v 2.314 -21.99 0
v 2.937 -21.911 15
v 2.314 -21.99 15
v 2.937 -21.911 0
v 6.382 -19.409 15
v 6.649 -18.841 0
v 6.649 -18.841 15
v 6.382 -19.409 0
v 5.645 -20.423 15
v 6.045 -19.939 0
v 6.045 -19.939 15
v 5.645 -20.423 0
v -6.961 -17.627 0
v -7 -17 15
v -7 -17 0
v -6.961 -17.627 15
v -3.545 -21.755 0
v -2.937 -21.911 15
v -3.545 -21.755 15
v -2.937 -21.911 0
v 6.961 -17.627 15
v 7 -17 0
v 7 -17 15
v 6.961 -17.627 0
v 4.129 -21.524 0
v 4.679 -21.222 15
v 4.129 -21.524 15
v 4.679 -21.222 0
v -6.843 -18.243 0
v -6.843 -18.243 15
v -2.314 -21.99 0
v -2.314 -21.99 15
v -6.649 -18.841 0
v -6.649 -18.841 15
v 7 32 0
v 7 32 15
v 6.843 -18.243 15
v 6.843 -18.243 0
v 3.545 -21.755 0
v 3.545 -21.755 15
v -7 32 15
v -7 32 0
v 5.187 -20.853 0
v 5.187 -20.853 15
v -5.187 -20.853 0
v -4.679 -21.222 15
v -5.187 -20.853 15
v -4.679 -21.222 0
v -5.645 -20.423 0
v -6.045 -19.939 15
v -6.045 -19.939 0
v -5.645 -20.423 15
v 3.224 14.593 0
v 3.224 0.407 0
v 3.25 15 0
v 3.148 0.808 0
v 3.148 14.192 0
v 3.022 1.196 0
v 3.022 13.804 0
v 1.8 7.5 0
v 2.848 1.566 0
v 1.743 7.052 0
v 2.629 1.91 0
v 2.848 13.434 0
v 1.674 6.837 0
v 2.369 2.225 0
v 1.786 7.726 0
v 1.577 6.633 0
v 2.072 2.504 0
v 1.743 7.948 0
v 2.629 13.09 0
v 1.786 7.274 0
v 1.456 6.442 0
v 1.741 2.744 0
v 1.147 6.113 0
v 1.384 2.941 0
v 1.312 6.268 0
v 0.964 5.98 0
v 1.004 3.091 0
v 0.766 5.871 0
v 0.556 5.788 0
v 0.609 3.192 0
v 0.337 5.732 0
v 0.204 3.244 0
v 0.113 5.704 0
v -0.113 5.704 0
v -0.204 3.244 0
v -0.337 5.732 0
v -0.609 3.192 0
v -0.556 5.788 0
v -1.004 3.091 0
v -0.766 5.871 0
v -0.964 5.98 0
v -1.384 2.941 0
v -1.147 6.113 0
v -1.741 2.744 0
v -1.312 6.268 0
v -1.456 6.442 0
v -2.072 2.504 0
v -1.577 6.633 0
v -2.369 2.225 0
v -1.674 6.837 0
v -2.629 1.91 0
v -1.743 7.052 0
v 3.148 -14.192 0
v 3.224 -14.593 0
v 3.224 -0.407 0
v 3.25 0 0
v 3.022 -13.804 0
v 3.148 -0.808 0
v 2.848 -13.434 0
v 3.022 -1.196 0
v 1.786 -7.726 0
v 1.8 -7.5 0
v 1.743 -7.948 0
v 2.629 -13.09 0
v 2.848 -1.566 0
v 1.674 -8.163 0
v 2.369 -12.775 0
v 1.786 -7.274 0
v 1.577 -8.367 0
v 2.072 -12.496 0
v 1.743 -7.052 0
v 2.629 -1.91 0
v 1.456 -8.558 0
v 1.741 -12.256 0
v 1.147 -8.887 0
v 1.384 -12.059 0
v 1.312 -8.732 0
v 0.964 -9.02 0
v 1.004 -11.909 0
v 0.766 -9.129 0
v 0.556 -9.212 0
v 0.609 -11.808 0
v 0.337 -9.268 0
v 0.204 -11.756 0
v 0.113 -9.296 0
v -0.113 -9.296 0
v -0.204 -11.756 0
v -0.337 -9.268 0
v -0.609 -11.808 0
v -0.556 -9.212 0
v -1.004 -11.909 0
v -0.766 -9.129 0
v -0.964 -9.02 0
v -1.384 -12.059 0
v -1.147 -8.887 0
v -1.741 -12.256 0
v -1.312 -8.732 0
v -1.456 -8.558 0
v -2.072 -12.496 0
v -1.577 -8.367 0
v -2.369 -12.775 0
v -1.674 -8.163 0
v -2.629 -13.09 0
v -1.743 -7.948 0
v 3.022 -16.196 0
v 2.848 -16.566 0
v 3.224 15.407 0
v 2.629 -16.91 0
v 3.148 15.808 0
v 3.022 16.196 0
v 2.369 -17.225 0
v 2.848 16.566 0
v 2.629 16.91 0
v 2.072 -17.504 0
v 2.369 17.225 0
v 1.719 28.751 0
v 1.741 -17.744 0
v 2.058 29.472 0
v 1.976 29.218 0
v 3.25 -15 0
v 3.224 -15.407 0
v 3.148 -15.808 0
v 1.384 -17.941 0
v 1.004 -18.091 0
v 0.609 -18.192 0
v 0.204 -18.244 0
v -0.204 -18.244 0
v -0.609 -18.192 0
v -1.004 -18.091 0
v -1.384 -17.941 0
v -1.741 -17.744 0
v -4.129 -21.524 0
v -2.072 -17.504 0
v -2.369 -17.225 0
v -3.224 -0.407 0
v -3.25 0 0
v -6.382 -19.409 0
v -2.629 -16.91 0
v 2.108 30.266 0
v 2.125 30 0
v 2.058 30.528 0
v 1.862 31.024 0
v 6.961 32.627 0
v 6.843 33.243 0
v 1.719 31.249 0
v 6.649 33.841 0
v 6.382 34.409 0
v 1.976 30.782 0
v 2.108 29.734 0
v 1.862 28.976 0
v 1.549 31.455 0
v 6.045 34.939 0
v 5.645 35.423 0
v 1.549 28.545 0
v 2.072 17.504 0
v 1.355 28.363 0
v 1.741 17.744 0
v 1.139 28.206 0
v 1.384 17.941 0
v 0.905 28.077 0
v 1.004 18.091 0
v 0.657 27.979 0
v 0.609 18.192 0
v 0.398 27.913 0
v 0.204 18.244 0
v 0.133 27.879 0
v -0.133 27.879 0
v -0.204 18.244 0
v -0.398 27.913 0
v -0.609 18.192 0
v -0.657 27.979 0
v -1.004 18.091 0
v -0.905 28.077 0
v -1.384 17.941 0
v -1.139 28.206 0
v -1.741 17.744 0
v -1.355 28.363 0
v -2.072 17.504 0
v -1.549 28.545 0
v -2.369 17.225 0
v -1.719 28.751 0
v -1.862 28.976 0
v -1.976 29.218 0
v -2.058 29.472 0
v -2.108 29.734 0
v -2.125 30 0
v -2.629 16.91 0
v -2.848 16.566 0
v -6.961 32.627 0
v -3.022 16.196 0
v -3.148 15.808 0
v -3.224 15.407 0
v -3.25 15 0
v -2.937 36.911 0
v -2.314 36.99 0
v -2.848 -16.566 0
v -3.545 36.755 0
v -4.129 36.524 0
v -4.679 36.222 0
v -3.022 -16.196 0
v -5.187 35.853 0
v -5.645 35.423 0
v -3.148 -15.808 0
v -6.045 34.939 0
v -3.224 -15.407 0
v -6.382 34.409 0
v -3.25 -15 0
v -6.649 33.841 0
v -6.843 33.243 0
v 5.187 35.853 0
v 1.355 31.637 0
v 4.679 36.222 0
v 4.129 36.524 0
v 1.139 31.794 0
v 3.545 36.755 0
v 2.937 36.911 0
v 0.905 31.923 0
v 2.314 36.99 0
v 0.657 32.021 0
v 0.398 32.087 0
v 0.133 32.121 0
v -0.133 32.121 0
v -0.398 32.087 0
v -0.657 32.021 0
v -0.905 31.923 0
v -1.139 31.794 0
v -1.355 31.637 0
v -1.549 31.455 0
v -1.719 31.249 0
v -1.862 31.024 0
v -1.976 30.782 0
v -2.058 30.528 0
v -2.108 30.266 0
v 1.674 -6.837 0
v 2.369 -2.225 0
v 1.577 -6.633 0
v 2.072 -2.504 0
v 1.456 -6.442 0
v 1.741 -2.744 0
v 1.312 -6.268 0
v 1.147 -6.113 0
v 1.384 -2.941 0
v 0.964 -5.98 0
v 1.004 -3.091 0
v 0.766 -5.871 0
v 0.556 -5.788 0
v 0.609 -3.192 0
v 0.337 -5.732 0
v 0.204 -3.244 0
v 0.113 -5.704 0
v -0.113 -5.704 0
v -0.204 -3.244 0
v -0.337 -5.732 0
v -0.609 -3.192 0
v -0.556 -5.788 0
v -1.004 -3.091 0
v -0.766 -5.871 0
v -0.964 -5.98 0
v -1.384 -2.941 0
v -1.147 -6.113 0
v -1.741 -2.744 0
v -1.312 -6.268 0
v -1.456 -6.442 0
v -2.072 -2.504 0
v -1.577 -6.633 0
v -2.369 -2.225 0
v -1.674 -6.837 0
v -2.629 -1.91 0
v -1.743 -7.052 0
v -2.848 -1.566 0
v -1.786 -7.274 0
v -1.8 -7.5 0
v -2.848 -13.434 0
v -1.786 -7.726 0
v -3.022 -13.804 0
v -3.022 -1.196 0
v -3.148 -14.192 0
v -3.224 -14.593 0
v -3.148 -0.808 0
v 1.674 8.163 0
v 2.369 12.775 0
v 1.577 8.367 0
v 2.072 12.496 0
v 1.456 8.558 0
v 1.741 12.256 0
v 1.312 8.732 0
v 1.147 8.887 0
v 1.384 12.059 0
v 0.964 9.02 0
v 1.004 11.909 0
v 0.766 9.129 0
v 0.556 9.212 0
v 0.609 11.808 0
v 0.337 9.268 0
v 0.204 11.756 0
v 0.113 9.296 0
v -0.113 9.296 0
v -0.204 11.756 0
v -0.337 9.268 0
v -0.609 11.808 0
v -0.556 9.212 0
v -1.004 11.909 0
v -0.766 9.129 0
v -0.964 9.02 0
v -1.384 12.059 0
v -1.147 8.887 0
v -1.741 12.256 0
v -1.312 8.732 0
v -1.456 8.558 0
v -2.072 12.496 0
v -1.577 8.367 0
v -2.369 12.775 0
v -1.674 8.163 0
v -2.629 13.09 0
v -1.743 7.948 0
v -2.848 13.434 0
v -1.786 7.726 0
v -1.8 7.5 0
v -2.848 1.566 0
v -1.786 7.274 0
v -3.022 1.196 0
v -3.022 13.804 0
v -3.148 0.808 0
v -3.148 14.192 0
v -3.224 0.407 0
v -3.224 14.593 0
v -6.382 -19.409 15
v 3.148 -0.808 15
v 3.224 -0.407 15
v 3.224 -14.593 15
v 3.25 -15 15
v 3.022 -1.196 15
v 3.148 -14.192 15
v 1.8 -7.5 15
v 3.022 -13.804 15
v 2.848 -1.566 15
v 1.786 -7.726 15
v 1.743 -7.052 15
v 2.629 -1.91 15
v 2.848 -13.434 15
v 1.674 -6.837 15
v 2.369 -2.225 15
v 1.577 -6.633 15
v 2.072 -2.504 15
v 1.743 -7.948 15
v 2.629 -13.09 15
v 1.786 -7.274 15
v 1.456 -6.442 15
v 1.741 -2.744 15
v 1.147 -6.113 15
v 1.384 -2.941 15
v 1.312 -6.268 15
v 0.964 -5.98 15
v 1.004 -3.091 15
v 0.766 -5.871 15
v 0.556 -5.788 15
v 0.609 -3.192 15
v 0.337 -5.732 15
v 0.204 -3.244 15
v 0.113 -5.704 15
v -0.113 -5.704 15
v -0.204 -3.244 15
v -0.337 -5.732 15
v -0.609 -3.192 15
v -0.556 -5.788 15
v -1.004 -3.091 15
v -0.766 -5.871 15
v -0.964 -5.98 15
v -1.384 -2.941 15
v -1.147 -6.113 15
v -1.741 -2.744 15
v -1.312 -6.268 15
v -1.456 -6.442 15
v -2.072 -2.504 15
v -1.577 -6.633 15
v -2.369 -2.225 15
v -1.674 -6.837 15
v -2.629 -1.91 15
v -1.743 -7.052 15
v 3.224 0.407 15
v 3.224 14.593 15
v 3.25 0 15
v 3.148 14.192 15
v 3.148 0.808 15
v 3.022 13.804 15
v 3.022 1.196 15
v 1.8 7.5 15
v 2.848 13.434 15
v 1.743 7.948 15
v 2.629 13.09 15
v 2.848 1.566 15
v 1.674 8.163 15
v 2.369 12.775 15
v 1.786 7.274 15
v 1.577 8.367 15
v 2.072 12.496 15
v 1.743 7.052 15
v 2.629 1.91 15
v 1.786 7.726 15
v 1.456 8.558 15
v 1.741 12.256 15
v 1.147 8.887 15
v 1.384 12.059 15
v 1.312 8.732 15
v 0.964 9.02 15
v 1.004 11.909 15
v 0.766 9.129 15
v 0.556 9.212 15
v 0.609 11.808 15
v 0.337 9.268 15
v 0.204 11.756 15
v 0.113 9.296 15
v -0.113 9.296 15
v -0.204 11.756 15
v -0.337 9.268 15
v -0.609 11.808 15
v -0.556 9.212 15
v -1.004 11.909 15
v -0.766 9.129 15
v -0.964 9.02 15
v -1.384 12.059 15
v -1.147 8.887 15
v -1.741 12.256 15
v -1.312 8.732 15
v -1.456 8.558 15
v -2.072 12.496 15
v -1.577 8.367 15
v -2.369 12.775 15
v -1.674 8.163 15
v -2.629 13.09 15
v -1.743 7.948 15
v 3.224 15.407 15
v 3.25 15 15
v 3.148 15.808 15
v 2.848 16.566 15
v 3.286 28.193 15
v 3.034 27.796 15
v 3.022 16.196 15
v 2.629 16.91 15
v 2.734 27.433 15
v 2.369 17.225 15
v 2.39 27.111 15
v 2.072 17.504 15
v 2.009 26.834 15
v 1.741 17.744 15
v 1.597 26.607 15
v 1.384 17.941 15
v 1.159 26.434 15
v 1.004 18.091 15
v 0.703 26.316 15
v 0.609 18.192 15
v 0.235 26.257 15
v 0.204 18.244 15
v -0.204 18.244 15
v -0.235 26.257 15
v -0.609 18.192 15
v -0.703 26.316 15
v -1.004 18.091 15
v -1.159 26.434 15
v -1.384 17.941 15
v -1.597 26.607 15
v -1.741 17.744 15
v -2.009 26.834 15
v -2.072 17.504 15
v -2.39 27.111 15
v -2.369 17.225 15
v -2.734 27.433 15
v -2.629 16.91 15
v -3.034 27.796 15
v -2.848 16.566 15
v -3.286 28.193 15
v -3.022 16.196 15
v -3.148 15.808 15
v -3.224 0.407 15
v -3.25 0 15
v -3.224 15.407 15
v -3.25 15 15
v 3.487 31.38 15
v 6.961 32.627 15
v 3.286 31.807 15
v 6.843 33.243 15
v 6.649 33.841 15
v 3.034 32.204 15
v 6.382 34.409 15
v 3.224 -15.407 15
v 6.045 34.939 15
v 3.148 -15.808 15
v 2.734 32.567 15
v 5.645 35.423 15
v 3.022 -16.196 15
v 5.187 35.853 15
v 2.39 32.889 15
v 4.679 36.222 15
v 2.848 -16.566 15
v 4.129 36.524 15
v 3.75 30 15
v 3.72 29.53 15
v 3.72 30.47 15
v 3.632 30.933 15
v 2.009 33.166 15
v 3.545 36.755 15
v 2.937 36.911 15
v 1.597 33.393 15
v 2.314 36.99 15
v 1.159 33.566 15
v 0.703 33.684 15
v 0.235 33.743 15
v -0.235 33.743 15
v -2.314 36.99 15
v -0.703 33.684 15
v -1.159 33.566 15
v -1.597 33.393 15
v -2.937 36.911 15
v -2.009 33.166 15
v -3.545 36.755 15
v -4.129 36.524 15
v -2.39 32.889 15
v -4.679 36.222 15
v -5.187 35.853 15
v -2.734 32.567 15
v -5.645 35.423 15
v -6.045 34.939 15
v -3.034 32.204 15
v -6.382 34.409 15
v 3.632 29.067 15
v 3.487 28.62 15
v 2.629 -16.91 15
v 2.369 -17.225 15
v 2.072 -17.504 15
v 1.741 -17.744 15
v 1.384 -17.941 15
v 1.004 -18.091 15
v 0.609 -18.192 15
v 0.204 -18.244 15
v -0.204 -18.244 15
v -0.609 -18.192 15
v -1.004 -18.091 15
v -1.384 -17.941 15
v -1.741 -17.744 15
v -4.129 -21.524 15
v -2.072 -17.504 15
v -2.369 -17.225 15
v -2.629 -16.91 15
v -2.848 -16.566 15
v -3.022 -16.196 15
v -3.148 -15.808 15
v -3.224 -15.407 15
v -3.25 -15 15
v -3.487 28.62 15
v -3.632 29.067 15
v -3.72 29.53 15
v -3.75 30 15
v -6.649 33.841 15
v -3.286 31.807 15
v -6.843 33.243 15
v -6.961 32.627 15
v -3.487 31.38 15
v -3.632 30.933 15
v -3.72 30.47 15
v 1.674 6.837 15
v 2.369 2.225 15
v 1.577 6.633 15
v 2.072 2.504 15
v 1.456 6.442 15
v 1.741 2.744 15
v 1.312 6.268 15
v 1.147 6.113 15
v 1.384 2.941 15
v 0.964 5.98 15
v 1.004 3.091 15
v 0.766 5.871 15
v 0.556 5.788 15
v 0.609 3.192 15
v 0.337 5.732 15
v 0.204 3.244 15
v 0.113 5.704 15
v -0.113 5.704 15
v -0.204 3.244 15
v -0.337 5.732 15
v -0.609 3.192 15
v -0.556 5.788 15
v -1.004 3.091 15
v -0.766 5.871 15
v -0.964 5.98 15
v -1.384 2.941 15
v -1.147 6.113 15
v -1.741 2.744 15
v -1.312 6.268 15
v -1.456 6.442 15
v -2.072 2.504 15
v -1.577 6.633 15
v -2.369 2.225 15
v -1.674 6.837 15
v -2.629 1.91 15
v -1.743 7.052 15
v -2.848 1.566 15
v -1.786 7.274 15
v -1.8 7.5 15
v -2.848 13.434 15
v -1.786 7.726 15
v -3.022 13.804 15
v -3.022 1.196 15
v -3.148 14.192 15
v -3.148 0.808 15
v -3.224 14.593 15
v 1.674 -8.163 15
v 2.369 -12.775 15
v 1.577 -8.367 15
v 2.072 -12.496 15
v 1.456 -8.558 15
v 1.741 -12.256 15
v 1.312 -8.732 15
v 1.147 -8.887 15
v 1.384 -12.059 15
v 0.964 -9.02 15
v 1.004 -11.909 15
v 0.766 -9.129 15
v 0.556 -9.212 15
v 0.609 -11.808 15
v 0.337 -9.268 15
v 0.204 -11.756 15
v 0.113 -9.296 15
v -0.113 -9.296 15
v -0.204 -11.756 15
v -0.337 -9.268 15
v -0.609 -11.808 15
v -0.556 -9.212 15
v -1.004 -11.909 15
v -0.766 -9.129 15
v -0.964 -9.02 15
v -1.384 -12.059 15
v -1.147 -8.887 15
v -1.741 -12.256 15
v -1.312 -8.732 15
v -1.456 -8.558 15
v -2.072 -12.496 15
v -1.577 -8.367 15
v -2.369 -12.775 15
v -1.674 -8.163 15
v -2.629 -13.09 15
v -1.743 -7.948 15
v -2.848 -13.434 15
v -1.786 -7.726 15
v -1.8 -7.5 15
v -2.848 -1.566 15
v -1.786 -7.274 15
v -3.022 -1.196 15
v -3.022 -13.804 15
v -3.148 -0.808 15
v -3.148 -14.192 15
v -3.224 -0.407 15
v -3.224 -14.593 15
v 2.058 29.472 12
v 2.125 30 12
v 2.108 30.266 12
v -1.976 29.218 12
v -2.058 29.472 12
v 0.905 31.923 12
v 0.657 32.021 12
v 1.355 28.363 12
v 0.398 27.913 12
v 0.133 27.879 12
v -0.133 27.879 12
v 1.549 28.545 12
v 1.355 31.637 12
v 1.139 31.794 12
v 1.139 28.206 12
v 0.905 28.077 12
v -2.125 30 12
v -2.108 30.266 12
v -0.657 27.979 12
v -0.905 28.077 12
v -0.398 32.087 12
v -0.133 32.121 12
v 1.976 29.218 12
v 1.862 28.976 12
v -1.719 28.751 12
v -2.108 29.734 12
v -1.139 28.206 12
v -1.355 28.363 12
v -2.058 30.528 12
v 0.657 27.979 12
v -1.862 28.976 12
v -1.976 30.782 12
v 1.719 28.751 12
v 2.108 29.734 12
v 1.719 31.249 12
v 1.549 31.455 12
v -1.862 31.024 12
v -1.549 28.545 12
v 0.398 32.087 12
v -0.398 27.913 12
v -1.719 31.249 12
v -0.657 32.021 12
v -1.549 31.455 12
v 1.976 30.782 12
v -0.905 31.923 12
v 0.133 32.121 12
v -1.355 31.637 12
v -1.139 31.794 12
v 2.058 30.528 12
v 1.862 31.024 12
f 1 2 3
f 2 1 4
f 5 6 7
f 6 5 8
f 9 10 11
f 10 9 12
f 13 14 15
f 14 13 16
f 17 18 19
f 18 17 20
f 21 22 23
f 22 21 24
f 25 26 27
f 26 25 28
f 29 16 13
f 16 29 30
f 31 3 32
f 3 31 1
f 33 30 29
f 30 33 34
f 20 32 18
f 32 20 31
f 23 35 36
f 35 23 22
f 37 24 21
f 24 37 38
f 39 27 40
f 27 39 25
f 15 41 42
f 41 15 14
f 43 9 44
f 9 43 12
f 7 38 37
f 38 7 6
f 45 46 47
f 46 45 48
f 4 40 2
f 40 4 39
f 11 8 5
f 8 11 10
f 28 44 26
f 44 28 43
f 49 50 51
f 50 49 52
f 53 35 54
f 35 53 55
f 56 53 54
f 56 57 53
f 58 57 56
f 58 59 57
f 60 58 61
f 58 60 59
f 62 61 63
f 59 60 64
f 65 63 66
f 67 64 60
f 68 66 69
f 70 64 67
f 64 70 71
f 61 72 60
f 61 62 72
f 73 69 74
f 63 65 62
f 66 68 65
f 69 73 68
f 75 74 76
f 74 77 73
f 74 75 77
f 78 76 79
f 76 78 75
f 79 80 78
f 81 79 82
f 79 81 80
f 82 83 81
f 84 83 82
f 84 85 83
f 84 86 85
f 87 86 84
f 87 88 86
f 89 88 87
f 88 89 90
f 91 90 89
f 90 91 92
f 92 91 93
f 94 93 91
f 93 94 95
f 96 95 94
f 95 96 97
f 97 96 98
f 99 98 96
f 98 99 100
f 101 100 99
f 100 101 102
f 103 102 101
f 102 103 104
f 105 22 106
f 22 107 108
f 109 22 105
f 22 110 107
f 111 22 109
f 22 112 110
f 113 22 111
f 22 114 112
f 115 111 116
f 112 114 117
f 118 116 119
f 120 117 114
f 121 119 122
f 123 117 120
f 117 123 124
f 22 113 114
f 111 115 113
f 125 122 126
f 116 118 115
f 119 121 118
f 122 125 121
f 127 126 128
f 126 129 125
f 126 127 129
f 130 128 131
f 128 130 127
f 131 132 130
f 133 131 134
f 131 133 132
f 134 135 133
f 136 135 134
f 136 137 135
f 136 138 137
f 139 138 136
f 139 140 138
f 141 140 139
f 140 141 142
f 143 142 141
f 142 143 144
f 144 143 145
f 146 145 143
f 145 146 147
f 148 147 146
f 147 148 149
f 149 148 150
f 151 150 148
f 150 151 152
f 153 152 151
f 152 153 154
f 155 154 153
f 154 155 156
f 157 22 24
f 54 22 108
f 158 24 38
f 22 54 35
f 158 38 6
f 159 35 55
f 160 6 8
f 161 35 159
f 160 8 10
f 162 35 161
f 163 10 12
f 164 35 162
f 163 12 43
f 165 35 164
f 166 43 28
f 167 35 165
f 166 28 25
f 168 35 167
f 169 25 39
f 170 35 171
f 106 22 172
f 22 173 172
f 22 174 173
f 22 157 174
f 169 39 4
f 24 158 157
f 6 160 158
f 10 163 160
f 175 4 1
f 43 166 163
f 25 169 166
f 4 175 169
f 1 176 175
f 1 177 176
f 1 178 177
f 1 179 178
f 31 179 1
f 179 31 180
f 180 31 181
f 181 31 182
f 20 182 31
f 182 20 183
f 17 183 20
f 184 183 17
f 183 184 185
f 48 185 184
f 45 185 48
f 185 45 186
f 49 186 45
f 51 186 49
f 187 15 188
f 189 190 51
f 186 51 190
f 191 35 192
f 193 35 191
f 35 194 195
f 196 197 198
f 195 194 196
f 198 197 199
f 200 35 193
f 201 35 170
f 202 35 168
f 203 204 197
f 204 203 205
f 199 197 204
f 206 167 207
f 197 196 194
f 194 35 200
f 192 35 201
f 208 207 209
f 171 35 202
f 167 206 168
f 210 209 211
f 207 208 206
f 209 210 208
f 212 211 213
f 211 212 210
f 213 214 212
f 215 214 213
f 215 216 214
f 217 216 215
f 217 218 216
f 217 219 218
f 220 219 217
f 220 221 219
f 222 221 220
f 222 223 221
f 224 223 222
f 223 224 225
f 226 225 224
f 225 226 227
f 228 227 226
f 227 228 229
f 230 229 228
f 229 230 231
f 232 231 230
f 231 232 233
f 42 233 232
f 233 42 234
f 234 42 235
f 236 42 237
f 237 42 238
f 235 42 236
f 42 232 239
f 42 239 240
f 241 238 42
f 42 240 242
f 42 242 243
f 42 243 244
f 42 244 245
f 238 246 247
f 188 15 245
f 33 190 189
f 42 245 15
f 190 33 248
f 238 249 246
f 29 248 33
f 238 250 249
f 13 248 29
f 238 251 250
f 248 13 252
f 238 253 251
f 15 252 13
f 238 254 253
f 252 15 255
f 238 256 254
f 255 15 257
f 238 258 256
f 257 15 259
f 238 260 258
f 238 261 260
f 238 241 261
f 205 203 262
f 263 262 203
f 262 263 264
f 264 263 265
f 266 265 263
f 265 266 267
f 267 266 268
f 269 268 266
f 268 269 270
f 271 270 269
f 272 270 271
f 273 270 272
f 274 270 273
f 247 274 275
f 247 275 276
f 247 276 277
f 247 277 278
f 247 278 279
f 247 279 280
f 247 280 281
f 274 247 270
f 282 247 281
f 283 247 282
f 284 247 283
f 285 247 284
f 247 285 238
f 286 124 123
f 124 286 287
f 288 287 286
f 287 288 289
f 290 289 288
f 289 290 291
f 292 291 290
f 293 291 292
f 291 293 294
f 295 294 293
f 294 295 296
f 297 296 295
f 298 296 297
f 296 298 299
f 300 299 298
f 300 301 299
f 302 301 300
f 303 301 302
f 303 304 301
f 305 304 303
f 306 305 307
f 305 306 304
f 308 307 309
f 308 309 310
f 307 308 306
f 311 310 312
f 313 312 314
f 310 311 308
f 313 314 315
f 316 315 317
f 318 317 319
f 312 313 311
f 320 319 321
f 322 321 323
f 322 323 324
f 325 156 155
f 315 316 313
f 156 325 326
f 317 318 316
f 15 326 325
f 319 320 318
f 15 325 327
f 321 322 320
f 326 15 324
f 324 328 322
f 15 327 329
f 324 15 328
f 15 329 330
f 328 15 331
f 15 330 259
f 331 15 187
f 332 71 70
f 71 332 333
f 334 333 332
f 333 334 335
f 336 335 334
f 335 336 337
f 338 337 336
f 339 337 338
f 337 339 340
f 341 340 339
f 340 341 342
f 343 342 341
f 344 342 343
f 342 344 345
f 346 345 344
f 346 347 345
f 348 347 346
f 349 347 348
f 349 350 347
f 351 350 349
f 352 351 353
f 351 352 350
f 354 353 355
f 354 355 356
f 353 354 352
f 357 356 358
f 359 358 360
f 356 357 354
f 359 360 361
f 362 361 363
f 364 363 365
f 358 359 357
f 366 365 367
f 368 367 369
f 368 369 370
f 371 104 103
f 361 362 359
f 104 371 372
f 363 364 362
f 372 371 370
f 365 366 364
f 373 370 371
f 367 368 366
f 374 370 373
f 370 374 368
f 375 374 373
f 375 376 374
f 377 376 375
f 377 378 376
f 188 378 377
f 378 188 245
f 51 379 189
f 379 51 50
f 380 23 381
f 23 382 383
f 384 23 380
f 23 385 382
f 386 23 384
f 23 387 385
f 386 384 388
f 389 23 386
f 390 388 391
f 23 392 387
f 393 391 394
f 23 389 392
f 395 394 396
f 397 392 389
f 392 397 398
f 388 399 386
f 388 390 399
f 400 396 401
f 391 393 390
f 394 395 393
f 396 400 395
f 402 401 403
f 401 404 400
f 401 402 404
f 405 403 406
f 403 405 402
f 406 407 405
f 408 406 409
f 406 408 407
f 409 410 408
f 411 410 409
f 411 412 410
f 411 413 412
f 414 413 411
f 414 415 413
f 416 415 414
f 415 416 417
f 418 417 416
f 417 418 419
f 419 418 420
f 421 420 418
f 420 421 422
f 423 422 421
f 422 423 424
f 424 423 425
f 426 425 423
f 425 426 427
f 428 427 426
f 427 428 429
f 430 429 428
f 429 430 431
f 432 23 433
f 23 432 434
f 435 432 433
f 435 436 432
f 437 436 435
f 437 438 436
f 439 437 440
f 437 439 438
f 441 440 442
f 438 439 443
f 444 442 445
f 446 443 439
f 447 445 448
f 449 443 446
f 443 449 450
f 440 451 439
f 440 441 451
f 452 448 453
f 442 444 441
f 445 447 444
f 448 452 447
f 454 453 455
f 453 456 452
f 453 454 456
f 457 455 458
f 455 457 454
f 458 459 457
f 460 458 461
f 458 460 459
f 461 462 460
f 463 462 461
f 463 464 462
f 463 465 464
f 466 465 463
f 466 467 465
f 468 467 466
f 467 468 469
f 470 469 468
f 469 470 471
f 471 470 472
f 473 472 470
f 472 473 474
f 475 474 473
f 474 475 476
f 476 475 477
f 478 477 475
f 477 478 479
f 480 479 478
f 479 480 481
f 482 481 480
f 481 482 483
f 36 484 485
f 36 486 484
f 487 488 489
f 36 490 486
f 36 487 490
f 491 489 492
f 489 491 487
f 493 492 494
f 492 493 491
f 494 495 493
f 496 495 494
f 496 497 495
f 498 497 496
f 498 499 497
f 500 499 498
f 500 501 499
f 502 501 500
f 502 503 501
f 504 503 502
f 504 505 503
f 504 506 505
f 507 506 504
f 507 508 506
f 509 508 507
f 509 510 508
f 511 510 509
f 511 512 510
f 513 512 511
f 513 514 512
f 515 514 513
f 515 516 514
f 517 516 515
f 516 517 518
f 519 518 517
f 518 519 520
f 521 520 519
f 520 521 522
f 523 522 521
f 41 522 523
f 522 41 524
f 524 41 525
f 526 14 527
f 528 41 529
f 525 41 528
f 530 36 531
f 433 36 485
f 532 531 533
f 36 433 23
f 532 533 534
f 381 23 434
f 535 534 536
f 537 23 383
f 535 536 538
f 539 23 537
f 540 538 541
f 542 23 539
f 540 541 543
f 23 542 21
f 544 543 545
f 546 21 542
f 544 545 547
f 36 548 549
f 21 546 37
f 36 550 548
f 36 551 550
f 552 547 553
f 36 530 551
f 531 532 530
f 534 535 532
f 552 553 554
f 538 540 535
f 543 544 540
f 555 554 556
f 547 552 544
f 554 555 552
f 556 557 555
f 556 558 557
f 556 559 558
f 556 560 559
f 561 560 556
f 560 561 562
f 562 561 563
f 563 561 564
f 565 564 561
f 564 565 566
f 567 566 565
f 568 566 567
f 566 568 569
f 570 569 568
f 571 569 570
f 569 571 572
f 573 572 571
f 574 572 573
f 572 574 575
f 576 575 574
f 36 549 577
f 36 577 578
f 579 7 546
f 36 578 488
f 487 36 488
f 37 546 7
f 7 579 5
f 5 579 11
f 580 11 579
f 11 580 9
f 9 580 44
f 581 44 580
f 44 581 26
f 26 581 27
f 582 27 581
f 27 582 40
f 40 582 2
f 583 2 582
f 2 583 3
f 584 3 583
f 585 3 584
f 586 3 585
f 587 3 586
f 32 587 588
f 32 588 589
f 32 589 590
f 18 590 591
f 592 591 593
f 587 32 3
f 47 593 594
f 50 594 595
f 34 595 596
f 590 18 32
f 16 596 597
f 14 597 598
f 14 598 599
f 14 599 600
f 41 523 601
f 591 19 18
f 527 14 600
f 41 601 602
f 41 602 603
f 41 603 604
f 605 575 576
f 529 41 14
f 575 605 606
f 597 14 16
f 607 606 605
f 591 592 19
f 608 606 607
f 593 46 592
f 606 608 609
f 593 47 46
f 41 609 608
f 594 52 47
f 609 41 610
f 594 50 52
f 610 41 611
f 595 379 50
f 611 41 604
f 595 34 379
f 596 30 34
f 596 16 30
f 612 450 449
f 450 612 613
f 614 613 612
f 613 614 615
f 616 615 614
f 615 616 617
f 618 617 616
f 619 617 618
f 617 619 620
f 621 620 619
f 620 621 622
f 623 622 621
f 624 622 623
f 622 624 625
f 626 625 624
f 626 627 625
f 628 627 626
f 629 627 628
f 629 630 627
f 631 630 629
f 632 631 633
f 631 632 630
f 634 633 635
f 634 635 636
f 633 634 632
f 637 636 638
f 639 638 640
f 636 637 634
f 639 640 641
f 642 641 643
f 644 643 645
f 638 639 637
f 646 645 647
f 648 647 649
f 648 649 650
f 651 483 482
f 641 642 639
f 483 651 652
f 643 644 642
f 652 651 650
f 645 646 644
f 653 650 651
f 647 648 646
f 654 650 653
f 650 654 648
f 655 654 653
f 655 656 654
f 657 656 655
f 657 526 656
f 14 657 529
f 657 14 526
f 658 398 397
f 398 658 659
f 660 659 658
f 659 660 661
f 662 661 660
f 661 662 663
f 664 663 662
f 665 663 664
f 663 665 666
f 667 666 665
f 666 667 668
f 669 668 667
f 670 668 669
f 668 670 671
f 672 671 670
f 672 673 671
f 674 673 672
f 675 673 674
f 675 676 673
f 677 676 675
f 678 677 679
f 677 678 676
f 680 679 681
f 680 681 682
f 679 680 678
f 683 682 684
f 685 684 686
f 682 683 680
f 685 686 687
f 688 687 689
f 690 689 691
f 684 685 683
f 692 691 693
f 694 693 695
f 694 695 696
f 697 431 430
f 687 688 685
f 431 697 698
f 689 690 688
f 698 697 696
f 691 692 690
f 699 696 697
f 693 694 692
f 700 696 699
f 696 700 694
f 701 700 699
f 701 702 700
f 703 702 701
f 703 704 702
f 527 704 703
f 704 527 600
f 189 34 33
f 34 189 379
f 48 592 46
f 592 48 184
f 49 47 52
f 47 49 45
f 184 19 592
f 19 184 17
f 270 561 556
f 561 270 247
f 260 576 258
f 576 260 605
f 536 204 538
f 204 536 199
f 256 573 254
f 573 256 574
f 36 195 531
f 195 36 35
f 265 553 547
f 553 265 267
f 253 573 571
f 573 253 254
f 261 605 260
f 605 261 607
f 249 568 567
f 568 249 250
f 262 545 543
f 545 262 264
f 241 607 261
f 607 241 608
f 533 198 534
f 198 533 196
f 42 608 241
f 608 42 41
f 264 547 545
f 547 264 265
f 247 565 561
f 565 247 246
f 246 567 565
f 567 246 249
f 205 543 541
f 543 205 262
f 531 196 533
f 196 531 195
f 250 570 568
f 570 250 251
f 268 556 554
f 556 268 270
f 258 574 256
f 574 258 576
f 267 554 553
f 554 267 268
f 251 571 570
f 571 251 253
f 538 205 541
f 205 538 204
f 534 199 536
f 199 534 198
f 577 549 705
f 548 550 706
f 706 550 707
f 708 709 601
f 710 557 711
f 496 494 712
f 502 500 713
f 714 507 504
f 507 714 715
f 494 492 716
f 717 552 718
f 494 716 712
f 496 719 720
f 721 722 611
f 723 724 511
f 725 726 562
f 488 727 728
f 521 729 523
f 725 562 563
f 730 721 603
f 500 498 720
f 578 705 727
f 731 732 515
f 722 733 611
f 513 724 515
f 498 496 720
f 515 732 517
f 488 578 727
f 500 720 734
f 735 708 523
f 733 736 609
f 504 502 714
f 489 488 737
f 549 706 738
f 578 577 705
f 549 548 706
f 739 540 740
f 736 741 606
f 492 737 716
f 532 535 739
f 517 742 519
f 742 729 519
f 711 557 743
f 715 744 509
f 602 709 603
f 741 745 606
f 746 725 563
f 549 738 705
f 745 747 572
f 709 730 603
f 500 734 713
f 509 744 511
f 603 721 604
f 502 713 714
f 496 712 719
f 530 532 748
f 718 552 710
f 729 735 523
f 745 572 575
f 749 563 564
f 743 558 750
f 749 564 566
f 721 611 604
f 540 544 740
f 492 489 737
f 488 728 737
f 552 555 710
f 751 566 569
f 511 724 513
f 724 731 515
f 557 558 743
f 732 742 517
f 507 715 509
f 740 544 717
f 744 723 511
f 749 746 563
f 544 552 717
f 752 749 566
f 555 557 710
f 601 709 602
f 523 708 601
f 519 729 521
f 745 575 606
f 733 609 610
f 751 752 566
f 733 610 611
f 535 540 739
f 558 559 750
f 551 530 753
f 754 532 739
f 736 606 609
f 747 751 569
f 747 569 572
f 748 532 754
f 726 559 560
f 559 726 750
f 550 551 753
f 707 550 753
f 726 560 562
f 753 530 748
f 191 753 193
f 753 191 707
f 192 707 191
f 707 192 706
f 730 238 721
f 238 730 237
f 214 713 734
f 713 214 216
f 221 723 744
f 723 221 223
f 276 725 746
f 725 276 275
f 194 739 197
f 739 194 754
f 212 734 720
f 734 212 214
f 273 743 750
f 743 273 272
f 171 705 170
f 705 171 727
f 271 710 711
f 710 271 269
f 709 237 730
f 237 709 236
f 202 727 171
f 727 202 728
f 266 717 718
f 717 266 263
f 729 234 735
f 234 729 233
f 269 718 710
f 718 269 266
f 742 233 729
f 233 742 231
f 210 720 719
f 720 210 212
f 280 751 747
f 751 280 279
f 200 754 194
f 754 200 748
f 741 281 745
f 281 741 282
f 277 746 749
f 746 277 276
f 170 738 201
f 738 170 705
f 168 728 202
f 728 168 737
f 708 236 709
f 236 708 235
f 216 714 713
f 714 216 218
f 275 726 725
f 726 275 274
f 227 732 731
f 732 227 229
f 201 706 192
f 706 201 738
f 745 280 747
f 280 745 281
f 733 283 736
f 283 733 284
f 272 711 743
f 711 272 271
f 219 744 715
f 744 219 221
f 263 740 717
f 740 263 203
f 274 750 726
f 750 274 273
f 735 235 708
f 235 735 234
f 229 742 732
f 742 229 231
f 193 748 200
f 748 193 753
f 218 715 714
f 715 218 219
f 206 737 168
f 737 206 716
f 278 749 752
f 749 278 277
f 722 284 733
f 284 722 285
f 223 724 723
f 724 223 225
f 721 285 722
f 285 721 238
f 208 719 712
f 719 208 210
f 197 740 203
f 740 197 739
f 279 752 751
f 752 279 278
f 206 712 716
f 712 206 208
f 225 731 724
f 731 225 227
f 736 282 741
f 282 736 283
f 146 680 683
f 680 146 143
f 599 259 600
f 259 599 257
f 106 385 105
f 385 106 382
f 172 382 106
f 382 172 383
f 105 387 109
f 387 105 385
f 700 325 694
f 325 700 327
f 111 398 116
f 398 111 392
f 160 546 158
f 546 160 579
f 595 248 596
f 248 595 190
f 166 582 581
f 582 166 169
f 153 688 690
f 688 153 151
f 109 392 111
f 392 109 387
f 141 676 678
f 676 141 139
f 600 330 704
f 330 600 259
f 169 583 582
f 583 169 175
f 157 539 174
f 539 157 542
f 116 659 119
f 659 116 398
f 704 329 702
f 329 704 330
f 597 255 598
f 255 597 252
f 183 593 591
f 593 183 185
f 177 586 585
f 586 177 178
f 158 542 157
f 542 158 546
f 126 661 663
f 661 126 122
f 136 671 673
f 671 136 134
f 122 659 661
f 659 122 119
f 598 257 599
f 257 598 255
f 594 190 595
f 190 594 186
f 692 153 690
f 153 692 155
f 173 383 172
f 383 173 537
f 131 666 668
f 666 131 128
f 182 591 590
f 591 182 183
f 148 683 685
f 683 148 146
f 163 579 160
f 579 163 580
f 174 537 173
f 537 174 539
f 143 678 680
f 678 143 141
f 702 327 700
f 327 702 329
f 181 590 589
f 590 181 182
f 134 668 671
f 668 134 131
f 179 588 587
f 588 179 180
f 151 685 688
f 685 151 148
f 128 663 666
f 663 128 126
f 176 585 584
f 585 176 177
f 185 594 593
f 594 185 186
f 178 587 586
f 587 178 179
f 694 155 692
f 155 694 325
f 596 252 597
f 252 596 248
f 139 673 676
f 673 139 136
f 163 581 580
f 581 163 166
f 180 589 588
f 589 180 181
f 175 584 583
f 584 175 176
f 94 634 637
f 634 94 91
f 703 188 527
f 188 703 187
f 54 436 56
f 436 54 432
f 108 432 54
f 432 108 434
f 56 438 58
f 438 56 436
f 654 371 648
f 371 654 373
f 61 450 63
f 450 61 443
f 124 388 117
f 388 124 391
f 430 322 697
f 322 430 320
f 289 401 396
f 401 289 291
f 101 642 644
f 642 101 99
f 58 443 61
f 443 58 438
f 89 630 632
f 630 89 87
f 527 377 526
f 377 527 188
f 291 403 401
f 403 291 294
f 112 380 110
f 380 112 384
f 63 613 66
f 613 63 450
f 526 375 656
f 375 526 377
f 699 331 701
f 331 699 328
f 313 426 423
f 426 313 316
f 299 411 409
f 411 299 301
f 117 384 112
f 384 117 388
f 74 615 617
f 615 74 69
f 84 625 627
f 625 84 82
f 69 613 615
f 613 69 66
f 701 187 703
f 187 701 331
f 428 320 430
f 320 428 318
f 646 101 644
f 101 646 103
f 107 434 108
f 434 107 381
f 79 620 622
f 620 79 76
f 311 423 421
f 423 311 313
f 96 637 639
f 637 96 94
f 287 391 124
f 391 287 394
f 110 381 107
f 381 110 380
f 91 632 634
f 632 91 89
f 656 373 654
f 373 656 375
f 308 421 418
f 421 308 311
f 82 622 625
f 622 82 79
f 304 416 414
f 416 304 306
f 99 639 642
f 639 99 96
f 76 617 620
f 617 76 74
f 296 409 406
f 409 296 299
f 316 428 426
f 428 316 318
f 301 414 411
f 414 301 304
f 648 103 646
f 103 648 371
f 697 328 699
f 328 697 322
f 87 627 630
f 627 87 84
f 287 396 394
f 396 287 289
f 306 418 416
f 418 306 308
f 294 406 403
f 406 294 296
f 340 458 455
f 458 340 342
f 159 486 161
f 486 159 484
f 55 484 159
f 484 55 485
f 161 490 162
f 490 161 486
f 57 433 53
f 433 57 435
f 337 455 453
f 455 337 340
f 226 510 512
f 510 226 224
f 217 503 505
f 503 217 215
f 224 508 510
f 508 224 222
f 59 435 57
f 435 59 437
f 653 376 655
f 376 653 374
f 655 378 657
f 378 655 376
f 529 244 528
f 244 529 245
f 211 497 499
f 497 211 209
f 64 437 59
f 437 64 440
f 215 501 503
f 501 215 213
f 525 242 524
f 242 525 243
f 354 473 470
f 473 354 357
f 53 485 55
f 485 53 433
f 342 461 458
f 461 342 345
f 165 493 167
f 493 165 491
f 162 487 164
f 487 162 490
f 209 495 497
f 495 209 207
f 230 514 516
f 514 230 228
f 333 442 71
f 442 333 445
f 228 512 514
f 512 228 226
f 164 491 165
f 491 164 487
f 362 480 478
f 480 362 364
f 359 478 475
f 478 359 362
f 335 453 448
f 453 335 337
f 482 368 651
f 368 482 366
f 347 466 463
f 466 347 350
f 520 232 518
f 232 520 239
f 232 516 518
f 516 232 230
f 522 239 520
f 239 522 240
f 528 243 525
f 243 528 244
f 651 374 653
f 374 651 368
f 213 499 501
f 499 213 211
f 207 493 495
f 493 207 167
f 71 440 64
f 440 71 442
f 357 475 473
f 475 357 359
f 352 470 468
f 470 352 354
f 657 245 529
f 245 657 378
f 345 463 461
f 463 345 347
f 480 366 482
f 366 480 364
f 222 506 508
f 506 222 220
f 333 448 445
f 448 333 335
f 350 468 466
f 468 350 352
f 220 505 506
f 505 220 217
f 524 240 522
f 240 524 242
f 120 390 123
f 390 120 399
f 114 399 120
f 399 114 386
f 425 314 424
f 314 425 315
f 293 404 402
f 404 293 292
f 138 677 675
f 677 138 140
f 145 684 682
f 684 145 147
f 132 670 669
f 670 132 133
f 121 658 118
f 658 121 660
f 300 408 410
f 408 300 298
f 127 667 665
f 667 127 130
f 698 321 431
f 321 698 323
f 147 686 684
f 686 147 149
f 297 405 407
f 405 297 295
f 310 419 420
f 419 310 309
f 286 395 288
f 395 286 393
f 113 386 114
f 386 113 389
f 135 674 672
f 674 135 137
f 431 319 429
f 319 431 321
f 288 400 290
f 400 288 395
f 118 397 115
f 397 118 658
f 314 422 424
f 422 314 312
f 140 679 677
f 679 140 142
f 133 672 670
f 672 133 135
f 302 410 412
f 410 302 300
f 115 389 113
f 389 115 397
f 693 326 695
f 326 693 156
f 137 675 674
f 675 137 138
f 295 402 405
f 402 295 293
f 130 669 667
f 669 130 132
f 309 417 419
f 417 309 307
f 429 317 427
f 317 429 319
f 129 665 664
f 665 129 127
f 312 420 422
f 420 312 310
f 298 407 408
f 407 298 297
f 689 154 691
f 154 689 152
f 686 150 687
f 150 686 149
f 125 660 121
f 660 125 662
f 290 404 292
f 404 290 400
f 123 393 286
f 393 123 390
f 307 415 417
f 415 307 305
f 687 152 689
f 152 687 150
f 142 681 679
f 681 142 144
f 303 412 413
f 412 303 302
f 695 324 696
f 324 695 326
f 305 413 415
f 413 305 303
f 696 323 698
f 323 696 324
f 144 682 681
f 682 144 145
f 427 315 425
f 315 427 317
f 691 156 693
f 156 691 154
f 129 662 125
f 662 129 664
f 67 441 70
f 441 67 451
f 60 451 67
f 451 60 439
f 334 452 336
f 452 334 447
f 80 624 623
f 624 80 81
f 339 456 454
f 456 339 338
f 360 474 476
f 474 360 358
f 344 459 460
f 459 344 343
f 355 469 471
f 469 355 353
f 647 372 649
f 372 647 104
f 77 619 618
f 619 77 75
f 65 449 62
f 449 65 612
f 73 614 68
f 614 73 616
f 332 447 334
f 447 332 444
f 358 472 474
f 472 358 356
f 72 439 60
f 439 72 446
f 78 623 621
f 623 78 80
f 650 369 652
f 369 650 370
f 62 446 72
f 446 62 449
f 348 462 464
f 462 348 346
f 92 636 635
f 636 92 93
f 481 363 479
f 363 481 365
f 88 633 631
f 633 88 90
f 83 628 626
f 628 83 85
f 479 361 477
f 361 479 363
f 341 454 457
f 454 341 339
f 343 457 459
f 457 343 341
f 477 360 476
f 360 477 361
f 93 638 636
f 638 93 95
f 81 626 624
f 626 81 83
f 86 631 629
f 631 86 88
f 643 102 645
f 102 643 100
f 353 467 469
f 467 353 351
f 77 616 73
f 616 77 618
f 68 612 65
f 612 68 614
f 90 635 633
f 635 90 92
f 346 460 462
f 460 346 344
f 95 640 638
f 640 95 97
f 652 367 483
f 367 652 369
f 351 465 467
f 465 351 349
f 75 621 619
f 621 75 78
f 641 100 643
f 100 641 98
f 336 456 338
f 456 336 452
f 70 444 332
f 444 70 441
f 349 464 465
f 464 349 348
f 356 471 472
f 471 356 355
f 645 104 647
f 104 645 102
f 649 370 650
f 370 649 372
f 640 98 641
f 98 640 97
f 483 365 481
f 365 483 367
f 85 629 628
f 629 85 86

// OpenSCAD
$fn = 50;


difference() {
	union() {
		hull() {
			translate(v = [-2.0000000000, 17.0000000000, 0]) {
				cylinder(h = 15, r = 5);
			}
			translate(v = [2.0000000000, 17.0000000000, 0]) {
				cylinder(h = 15, r = 5);
			}
			translate(v = [-2.0000000000, -17.0000000000, 0]) {
				cylinder(h = 15, r = 5);
			}
			translate(v = [2.0000000000, -17.0000000000, 0]) {
				cylinder(h = 15, r = 5);
			}
		}
		translate(v = [0.0000000000, 22.5000000000, 0]) {
			hull() {
				translate(v = [-2.0000000000, 9.5000000000, 0]) {
					cylinder(h = 15, r = 5);
				}
				translate(v = [2.0000000000, 9.5000000000, 0]) {
					cylinder(h = 15, r = 5);
				}
				translate(v = [-2.0000000000, -9.5000000000, 0]) {
					cylinder(h = 15, r = 5);
				}
				translate(v = [2.0000000000, -9.5000000000, 0]) {
					cylinder(h = 15, r = 5);
				}
			}
		}
		translate(v = [0.0000000000, 22.5000000000, 0]) {
			hull() {
				translate(v = [-2.0000000000, 9.5000000000, 0]) {
					cylinder(h = 15, r = 5);
				}
				translate(v = [2.0000000000, 9.5000000000, 0]) {
					cylinder(h = 15, r = 5);
				}
				translate(v = [-2.0000000000, -9.5000000000, 0]) {
					cylinder(h = 15, r = 5);
				}
				translate(v = [2.0000000000, -9.5000000000, 0]) {
					cylinder(h = 15, r = 5);
				}
			}
		}
	}
	union() {
		translate(v = [0.0000000000, 30.0000000000, 15]) {
			rotate(a = [0, 0, 0]) {
				difference() {
					union() {
						#translate(v = [0, 0, -15.0000000000]) {
							cylinder(h = 15, r = 2.0000000000);
						}
						#translate(v = [0, 0, -3]) {
							cylinder(h = 3, r1 = 2.1250000000, r2 = 3.7500000000);
						}
						#translate(v = [0, 0, -15.0000000000]) {
							cylinder(h = 15, r = 2.1250000000);
						}
						#translate(v = [0, 0, -15.0000000000]) {
							cylinder(h = 15, r = 2.0000000000);
						}
					}
					union();
				}
			}
		}
		translate(v = [0.0000000000, 30.0000000000, 15]) {
			rotate(a = [0, 0, 0]) {
				difference() {
					union() {
						#translate(v = [0, 0, -15.0000000000]) {
							cylinder(h = 15, r = 2.0000000000);
						}
						#translate(v = [0, 0, -3]) {
							cylinder(h = 3, r1 = 2.1250000000, r2 = 3.7500000000);
						}
						#translate(v = [0, 0, -15.0000000000]) {
							cylinder(h = 15, r = 2.1250000000);
						}
						#translate(v = [0, 0, -15.0000000000]) {
							cylinder(h = 15, r = 2.0000000000);
						}
					}
					union();
				}
			}
		}
		translate(v = [0.0000000000, -15.0000000000, 0]) {
			translate(v = [0, 0, -100]) {
				cylinder(h = 200, r = 3.2500000000);
			}
		}
		translate(v = [0, 0, -100]) {
			cylinder(h = 200, r = 3.2500000000);
		}
		translate(v = [0.0000000000, 15.0000000000, 0]) {
			translate(v = [0, 0, -100]) {
				cylinder(h = 200, r = 3.2500000000);
			}
		}
		translate(v = [0.0000000000, -15.0000000000, 0]) {
			translate(v = [0, 0, -100]) {
				cylinder(h = 200, r = 1.8000000000);
			}
		}
		translate(v = [0.0000000000, -7.5000000000, 0]) {
			translate(v = [0, 0, -100]) {
				cylinder(h = 200, r = 1.8000000000);
			}
		}
		translate(v = [0, 0, -100]) {
			cylinder(h = 200, r = 1.8000000000);
		}
		translate(v = [0.0000000000, 7.5000000000, 0]) {
			translate(v = [0, 0, -100]) {
				cylinder(h = 200, r = 1.8000000000);
			}
		}
		translate(v = [0.0000000000, 15.0000000000, 0]) {
			translate(v = [0, 0, -100]) {
				cylinder(h = 200, r = 1.8000000000);
			}
		}
	}
}
